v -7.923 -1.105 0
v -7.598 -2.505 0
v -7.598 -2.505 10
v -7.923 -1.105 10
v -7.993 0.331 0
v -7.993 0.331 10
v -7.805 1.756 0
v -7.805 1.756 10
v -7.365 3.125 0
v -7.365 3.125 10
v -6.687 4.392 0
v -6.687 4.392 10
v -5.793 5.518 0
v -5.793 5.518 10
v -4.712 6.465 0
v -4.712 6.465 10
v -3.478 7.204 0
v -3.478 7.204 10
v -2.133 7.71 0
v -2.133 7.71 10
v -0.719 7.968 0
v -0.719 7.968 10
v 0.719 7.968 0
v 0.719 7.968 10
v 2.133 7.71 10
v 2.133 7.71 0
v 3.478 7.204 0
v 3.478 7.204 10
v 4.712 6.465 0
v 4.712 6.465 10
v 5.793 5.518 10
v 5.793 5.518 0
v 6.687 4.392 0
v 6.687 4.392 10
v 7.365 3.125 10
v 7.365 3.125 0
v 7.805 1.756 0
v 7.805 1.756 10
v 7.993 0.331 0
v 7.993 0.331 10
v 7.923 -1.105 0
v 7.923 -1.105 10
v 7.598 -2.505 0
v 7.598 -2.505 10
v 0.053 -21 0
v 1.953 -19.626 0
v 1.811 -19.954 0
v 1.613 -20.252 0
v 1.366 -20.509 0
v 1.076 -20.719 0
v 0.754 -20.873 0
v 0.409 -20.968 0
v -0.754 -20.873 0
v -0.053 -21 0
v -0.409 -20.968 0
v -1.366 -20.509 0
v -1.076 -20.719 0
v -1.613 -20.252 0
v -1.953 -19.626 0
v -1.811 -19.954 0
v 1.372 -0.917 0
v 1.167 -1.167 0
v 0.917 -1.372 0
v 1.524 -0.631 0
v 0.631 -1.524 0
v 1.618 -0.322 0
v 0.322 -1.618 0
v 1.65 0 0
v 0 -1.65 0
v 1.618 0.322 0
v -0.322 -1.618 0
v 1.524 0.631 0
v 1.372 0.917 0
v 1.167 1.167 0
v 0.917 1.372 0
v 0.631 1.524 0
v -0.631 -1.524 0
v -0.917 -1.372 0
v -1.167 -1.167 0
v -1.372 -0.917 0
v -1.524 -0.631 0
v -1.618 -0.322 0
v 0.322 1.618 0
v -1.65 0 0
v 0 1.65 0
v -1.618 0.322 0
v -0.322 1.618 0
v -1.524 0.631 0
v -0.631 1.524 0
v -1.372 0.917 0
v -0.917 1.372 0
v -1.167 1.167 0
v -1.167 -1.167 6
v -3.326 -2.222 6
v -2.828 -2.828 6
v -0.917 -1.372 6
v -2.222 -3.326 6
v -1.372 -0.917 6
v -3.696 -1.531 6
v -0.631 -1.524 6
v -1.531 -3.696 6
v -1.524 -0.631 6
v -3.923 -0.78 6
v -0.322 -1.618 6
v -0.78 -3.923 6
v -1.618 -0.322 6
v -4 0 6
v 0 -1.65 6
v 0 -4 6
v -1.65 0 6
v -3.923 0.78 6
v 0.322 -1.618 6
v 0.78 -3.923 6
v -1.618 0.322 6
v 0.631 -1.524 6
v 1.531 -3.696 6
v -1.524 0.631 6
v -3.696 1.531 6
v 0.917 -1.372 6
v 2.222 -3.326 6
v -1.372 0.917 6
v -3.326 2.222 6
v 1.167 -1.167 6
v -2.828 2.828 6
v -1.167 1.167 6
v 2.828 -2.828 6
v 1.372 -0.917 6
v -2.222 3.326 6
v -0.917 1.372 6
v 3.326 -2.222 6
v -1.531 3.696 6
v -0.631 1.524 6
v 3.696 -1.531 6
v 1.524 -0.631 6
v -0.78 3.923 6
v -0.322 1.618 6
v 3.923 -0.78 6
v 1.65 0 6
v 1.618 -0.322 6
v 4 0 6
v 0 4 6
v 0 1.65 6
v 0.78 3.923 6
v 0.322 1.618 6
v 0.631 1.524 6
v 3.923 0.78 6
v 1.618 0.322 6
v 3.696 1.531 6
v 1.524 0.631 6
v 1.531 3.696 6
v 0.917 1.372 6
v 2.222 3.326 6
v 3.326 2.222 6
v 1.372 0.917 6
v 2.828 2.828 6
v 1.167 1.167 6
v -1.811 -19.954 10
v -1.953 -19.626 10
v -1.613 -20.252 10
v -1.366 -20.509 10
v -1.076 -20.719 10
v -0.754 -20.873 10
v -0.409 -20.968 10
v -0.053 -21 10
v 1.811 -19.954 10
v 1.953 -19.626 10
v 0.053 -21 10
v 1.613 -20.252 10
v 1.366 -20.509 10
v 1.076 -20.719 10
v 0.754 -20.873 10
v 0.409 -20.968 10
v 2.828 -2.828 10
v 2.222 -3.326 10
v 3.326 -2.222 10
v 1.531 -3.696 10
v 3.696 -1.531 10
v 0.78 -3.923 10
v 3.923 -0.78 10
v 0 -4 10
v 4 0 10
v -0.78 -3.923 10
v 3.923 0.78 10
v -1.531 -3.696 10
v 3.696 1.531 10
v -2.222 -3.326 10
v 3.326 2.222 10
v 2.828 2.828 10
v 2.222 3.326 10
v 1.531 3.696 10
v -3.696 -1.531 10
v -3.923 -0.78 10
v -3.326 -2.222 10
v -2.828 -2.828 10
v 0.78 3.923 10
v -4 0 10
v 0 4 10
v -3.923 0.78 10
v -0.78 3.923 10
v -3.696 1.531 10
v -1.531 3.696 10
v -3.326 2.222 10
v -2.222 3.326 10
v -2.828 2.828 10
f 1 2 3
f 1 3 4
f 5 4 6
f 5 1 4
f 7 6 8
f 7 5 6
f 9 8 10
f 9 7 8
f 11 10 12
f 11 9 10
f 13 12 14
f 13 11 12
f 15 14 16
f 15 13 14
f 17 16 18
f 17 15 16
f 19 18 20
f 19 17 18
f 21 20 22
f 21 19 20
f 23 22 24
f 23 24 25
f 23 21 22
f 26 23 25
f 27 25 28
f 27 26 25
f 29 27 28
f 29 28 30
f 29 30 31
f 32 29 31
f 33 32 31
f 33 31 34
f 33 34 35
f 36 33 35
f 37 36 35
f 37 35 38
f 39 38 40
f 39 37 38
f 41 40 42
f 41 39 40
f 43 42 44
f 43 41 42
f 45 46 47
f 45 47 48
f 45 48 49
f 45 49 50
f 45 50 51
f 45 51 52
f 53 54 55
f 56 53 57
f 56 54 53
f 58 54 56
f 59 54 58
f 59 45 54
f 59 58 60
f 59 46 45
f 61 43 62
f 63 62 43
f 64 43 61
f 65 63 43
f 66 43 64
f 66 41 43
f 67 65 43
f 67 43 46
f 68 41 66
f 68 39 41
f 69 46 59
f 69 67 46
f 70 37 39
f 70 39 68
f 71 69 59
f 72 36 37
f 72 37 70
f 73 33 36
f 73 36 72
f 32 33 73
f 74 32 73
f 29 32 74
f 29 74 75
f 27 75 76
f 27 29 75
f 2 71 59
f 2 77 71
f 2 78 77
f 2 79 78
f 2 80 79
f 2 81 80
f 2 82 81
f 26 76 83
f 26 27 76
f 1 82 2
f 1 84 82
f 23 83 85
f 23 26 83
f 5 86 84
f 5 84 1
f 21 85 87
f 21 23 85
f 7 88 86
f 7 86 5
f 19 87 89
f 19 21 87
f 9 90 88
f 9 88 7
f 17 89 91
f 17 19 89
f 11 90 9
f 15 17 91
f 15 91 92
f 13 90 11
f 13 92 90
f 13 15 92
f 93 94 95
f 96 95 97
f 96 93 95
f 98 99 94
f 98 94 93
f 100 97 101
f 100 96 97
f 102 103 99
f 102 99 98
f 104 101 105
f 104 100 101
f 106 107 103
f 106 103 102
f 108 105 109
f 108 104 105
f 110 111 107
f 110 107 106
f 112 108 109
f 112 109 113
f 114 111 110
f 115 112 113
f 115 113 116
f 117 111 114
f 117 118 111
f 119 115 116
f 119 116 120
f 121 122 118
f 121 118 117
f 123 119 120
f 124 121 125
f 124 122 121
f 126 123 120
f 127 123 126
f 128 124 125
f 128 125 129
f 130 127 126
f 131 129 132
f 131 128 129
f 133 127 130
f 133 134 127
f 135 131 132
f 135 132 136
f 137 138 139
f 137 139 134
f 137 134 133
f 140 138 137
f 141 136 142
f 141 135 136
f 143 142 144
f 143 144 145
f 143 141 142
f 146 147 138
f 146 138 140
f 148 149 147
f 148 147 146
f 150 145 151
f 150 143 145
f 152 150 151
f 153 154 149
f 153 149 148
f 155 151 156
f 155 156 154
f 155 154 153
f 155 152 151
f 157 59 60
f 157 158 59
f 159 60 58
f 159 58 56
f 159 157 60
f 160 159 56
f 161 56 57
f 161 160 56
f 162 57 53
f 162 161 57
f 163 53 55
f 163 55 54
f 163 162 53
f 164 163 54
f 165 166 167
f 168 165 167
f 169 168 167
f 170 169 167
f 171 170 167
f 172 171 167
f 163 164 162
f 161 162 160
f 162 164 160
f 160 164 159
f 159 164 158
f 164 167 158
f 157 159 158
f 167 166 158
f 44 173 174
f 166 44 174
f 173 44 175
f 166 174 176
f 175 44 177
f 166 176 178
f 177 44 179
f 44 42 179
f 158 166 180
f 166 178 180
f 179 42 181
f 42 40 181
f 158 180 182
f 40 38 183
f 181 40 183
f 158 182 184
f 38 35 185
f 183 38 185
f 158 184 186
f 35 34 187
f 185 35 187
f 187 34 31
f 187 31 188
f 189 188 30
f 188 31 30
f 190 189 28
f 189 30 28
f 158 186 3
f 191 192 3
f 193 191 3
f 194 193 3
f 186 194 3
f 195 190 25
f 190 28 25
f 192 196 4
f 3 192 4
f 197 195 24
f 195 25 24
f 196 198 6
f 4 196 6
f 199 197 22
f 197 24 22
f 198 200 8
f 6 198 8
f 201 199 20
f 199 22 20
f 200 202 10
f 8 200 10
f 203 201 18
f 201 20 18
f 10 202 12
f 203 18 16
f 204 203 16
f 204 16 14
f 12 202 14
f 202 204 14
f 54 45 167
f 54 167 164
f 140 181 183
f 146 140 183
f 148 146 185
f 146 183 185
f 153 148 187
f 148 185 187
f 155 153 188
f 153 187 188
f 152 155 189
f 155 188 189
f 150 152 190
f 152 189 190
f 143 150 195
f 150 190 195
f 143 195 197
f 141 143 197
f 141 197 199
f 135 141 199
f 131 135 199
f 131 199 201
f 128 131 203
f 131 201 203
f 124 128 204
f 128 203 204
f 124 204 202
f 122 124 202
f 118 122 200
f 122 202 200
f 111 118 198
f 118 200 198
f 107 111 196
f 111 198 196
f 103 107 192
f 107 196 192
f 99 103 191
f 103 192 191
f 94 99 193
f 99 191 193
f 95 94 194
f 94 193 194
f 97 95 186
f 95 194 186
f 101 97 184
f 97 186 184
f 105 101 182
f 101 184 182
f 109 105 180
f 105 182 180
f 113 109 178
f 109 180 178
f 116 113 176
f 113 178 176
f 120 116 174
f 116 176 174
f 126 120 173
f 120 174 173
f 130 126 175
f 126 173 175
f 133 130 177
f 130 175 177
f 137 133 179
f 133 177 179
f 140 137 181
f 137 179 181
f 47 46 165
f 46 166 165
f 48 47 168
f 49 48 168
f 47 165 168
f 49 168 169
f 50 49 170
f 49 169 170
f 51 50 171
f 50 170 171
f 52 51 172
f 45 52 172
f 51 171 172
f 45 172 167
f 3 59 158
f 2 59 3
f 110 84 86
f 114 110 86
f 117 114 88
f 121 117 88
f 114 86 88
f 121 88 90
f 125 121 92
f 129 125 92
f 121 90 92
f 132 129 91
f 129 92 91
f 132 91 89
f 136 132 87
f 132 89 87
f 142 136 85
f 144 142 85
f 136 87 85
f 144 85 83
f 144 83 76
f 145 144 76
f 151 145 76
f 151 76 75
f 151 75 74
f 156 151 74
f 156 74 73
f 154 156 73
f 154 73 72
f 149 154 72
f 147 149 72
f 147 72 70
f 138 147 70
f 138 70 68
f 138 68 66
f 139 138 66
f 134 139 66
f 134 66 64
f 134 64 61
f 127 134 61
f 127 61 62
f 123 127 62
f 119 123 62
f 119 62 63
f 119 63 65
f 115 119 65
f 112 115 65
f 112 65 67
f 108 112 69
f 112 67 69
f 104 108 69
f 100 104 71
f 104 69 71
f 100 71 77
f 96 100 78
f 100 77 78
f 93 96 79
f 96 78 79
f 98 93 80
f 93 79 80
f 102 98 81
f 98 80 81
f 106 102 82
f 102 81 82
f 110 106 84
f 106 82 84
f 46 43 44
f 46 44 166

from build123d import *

# Parameters (mm, degrees)
EXTRUDE_1_DEPTH     = 10
FILLET_1_R          = 2
SKETCH_4_R          = 4
CUT_EXTRUDE_1_DEPTH = 4
M4X0_71_D           = 3.3


with BuildPart() as part:
    # Эскиз1 → Бобышка-Вытянуть1 (new body)
    with BuildSketch(Plane.XY):
        with BuildLine():
            Line((-1.5, -21), (-7.597720185, -2.504924749))
            ThreePointArc((-7.597720185, -2.504924749), (0, 8), (7.597720185, -2.504924749))
            Line((7.597720185, -2.504924749), (1.5, -21))
            Line((1.5, -21), (-1.5, -21))
        make_face()
    extrude(amount=EXTRUDE_1_DEPTH)

    # Скругление1
    fillet_1_edges = [part.edges().sort_by_distance(p)[0] for p in [
        (-1.5, -21, 5),
        (1.5, -21, 5),
    ]]
    fillet(fillet_1_edges, radius=FILLET_1_R)

    # Эскиз4 → Вырез-Вытянуть1 (cut)
    with BuildSketch(Plane.XY.offset(10)):
        Circle(SKETCH_4_R)
    extrude(amount=-CUT_EXTRUDE_1_DEPTH, mode=Mode.SUBTRACT)

    # Отверстие обработанное метчиком M4x0.71 (through all)
    with Locations(Plane.XY.offset(6)):
        with Locations((0, 0)):
            Hole(M4X0_71_D / 2)


solid = part.part
